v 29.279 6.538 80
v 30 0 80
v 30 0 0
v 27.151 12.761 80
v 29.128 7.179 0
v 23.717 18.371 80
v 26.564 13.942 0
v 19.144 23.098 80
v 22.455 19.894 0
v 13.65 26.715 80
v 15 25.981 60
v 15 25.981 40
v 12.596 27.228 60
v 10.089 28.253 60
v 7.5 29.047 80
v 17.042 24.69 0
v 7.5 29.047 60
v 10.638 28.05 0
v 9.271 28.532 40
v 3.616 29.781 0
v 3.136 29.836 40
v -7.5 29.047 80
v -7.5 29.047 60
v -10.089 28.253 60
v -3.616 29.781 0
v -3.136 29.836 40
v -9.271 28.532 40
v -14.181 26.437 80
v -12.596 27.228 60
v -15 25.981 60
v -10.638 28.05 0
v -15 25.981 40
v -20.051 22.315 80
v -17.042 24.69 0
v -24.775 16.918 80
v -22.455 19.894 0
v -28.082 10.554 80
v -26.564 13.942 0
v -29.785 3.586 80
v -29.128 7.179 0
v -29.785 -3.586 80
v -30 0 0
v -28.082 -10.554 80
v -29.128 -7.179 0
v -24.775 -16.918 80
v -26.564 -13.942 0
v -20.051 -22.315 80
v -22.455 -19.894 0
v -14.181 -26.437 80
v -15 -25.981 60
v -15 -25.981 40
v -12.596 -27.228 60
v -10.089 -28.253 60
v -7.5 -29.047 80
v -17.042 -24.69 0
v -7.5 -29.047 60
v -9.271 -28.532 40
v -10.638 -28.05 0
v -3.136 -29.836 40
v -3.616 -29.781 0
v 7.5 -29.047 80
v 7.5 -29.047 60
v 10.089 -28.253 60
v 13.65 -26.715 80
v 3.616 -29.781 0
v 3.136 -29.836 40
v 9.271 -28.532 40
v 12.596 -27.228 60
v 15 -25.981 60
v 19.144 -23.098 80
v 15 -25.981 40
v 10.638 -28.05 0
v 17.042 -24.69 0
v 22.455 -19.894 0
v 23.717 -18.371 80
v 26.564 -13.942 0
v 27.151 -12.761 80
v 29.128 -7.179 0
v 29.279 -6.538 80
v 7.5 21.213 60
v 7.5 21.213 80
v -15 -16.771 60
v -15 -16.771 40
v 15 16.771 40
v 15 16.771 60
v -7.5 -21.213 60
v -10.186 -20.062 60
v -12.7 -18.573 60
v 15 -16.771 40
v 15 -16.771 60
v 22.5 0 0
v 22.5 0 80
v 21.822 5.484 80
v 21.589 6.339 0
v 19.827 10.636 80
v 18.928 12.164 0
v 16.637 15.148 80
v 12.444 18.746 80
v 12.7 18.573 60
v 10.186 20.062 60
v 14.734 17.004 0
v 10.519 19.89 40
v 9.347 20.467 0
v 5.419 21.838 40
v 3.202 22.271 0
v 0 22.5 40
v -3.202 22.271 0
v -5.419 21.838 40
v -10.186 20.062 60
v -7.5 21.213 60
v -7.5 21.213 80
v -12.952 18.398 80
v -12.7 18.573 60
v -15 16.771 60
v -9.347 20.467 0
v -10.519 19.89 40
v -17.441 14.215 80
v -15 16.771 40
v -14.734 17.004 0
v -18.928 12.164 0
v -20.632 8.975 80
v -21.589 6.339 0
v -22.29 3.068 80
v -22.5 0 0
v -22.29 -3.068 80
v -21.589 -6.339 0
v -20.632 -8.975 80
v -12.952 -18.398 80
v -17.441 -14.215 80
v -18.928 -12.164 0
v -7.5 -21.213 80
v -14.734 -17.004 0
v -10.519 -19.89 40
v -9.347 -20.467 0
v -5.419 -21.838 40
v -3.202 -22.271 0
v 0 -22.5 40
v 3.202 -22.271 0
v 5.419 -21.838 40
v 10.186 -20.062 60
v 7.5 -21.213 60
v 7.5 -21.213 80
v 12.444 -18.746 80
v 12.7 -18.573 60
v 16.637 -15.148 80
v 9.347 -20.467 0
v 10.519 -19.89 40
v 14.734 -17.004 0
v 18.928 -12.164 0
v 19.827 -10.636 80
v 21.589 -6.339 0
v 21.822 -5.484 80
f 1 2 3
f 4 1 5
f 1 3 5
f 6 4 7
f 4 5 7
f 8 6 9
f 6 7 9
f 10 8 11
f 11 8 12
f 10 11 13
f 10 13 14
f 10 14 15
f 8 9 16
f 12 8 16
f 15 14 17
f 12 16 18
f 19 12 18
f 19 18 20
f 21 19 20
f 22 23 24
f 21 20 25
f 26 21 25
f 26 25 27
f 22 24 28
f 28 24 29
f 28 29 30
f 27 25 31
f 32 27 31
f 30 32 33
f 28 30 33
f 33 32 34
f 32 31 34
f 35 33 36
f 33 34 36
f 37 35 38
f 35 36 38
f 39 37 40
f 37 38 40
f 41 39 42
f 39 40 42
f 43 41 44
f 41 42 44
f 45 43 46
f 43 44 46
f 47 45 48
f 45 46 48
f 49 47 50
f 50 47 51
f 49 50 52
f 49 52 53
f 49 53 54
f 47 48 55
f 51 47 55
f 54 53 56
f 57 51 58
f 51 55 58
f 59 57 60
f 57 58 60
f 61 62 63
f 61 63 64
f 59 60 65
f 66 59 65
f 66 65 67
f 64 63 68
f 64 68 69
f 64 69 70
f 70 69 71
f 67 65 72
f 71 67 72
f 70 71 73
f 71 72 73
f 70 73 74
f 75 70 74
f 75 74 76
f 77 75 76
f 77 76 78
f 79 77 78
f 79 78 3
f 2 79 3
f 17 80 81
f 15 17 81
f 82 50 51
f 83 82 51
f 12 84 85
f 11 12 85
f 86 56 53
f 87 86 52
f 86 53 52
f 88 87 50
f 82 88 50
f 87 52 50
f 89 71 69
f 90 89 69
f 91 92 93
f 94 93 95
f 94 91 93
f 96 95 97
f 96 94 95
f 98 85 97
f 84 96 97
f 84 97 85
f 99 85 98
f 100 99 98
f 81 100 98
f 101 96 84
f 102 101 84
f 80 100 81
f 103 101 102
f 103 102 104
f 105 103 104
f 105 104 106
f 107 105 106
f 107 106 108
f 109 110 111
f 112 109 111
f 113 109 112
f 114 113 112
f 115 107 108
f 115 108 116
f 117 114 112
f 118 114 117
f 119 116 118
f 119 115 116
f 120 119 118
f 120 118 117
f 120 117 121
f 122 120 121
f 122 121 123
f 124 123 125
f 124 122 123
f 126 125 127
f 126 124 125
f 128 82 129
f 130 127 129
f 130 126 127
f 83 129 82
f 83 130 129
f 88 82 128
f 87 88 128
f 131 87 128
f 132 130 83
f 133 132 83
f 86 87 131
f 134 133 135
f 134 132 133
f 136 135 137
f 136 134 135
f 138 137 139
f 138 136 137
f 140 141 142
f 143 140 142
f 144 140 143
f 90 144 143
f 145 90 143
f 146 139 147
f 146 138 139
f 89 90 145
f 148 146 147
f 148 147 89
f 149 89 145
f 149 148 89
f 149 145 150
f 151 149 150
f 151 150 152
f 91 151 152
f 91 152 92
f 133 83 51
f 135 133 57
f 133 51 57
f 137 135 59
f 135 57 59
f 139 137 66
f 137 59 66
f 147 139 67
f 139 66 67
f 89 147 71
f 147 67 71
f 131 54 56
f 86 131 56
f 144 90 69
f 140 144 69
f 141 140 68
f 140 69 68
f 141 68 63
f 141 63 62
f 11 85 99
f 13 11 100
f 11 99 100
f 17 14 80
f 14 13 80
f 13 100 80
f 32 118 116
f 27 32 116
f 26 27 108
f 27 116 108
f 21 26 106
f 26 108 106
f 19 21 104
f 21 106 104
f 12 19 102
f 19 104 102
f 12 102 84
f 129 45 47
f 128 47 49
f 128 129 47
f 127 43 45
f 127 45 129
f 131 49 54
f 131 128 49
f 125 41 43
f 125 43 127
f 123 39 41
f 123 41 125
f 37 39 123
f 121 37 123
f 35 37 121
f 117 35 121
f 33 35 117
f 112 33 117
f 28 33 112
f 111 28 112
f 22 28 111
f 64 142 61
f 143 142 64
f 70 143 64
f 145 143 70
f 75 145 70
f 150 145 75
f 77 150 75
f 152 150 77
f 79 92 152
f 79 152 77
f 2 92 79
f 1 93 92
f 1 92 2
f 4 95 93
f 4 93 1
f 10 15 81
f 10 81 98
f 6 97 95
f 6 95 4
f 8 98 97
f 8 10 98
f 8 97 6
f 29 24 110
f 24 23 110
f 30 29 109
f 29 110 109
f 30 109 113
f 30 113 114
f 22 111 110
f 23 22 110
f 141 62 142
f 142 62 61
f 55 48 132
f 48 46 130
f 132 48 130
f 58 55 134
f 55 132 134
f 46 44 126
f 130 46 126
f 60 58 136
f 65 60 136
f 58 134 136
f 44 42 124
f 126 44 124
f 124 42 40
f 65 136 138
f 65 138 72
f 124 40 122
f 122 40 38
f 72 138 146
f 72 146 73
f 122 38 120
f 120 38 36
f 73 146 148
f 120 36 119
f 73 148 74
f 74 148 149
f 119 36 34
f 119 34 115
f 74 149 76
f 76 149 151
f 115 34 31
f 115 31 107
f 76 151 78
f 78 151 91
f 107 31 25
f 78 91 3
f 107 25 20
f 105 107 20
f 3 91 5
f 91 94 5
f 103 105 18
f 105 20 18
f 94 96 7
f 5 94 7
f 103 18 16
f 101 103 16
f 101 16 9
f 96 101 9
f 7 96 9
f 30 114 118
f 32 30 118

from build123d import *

# Parameters (mm, degrees)
F0_R     = 30
F0_R_2   = 22.5
F1_DEPTH = 80
F3_DEPTH = 30


with BuildPart() as f1:
    # F0 (on Top) → F1 (new body)
    with BuildSketch(Plane.XY):
        Circle(F0_R)
        Circle(F0_R_2, mode=Mode.SUBTRACT)
    extrude(amount=F1_DEPTH)

    # F2 (on Front) → F3 (cut, symmetric)
    with BuildSketch(Plane.XZ):
        Polygon((-7.5, 60), (-15, 60), (-15, 40), (15, 40), (15, 60), (7.5, 60), (7.5, 80), (-7.5, 80), align=None)
    extrude(amount=F3_DEPTH, both=True, mode=Mode.SUBTRACT)


solid = f1.part
